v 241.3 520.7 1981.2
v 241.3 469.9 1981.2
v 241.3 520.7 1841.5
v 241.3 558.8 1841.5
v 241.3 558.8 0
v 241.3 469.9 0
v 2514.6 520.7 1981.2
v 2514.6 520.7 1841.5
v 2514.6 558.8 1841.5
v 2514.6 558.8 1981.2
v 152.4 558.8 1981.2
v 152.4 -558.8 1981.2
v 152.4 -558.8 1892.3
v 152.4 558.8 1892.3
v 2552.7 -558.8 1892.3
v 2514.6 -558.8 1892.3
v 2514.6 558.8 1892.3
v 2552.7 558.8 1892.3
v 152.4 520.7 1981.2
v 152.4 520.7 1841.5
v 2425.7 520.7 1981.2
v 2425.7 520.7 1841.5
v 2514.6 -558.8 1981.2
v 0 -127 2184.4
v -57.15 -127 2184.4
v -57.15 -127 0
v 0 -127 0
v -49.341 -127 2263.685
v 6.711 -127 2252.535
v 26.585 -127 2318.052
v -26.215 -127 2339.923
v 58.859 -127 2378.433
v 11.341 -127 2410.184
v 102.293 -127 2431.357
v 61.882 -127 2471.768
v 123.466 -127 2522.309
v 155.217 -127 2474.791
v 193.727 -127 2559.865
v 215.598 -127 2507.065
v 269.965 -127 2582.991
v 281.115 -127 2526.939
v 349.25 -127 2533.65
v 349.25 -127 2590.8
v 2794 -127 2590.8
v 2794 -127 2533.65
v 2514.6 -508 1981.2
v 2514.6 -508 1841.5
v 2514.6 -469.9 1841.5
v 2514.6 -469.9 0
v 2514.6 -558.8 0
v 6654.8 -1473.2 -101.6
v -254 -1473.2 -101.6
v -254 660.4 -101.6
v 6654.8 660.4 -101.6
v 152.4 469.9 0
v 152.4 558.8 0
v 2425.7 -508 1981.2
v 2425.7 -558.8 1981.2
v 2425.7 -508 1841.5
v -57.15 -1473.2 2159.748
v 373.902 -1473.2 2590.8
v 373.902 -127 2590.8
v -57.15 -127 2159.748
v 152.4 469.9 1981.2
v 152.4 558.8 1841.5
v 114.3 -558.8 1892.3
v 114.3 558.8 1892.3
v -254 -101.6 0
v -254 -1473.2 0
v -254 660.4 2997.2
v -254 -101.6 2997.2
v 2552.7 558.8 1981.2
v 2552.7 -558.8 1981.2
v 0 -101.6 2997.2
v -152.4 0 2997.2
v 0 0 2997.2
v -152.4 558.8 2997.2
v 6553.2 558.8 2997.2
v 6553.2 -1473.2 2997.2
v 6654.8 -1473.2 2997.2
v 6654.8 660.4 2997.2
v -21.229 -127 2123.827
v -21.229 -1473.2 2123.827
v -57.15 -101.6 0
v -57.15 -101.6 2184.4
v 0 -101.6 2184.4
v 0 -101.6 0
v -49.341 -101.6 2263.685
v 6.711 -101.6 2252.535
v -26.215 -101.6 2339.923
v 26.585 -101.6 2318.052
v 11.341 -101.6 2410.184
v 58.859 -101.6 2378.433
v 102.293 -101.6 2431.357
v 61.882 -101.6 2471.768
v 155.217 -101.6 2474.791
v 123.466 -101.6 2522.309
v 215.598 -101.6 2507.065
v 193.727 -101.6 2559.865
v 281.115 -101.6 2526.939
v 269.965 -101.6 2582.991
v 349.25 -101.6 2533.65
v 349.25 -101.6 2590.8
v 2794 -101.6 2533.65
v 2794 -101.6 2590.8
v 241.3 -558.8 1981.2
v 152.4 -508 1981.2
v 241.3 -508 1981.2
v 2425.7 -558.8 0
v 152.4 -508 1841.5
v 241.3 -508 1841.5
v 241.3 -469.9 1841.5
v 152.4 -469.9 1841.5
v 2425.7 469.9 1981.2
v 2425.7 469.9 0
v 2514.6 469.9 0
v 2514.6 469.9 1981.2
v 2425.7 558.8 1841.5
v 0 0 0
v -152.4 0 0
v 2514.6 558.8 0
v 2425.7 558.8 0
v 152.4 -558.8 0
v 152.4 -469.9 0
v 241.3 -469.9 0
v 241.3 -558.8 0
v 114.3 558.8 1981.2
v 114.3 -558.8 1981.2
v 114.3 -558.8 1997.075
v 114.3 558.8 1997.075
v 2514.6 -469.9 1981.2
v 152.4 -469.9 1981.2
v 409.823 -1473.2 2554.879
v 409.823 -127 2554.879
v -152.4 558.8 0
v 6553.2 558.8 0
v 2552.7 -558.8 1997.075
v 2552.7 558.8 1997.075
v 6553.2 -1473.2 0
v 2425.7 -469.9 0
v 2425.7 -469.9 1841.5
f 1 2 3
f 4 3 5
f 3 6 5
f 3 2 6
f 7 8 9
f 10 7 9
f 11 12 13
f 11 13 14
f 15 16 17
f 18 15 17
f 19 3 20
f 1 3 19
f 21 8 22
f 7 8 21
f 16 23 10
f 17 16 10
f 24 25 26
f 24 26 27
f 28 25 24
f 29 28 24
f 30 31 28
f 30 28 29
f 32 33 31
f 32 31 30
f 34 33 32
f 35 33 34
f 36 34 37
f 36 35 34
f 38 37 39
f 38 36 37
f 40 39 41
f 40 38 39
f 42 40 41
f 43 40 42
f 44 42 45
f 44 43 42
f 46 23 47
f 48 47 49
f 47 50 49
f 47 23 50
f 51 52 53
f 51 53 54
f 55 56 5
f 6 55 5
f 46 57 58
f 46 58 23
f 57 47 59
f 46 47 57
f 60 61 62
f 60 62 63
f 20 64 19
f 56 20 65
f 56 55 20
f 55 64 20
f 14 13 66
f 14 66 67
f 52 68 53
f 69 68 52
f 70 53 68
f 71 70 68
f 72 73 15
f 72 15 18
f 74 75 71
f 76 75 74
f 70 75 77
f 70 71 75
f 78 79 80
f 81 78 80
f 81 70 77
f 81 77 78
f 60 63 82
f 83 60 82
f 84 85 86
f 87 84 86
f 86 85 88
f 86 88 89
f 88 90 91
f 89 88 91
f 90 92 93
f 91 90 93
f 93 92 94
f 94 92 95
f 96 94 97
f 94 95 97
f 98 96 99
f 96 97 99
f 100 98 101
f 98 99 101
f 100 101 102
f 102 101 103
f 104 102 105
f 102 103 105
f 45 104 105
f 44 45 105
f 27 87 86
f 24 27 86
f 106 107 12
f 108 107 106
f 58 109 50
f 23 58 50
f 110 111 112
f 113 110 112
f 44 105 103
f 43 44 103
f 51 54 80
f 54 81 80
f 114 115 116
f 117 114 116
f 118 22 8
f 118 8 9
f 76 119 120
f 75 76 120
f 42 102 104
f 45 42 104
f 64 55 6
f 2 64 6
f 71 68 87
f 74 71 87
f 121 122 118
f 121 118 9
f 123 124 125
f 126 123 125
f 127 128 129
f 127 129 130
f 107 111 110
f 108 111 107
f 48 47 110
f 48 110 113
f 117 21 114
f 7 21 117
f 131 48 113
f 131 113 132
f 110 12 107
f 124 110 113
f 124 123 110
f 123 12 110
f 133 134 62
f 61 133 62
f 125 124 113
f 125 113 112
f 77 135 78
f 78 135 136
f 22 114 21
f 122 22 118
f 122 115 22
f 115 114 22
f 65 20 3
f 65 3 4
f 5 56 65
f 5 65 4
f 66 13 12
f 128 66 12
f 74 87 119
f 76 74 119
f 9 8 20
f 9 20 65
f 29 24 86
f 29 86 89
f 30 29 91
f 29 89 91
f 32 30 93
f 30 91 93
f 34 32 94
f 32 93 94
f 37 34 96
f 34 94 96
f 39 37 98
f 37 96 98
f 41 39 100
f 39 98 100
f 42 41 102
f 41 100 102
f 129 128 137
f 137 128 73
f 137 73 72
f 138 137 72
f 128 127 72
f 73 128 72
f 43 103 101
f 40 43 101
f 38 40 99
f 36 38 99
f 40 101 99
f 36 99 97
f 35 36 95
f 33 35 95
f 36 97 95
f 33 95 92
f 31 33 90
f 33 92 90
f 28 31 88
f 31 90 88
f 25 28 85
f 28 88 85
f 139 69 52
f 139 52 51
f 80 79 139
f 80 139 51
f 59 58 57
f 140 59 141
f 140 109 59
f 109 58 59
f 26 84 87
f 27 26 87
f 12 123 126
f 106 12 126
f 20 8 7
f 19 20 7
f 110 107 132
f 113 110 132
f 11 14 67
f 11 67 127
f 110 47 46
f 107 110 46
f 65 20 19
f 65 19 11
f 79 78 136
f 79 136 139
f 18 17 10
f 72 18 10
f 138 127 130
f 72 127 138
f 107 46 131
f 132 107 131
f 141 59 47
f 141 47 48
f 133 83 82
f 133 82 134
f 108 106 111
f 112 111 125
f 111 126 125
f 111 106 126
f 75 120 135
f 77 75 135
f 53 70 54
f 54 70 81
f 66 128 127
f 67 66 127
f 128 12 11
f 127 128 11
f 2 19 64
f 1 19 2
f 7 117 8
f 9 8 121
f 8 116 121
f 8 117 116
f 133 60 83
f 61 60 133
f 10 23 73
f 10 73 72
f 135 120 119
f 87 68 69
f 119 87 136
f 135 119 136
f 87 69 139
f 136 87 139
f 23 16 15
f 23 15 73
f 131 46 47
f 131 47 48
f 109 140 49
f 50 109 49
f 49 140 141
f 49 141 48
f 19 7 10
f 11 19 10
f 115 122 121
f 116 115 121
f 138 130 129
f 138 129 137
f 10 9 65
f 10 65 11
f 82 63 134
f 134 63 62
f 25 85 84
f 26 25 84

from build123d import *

# Parameters (mm, degrees)
F1_DEPTH  = 2997.2
F2_W      = 6908.8
F2_H      = 2133.6
F3_DEPTH  = 101.6
F5_DEPTH  = 25.4
F7_DEPTH  = 1346.2
F8_W      = 88.9
F8_H      = 88.9
F9_DEPTH  = 1981.2
F10_W     = 38.1
F10_H     = 139.7
F11_DEPTH = 2667
F12_DEPTH = 2362.2
F14_W     = 1117.6
F14_H     = 88.9
F15_DEPTH = 38.1
F17_W     = 2438.4
F17_H     = 1117.6
F18_DEPTH = 15.875


with BuildPart() as f1:
    # F0 (on Top) → F1 (new body)
    with BuildSketch(Plane.XY):
        Polygon((0, -101.6), (0, 0), (-152.4, 0), (-152.4, 558.8), (6553.2, 558.8), (6553.2, -1473.2), (6654.8, -1473.2), (6654.8, 660.4), (6553.2, 660.4), (-254, 660.4), (-254, -101.6), align=None)
    extrude(amount=F1_DEPTH)

    # F2 (on face) → F3 (join)
    with BuildSketch(Plane(origin=(0, 0, 0), x_dir=(1, 0, 0), z_dir=(0, 0, -1))):
        with Locations((3200.4, 406.4)):
            Rectangle(F2_W, F2_H)
    extrude(amount=F3_DEPTH)


with BuildPart() as f5:
    # F4 (on face) → F5 (new body)
    with BuildSketch(Plane.XZ.offset(101.6)):
        with BuildLine():
            Line((2794, 2590.8), (349.25, 2590.8))
            ThreePointArc((349.25, 2590.8), (61.881804, 2471.768196), (-57.15, 2184.4))
            Line((-57.15, 2184.4), (-57.15, 0))
            Line((-57.15, 0), (0, 0))
            Line((0, 0), (0, 2184.4))
            ThreePointArc((0, 2184.4), (102.292957, 2431.357043), (349.25, 2533.65))
            Line((349.25, 2533.65), (2794, 2533.65))
            Line((2794, 2533.65), (2794, 2590.8))
        make_face()
    extrude(amount=F5_DEPTH)


with BuildPart() as f7:
    # F6 (on face) → F7 (new body, through all)
    with BuildSketch(Plane.XZ.offset(127)):
        Polygon((373.902294, 2590.8), (-57.15, 2159.747706), (-21.228976, 2123.826682), (409.823318, 2554.878976), align=None)
    extrude(amount=F7_DEPTH)


with BuildPart() as f9:
    # F8 (on face) → F9 (new body)
    with BuildSketch(Plane.XY):
        with Locations((196.85, 514.35)):
            Rectangle(F8_W, F8_H)
        with Locations((2470.15, 514.35)):
            Rectangle(F8_W, F8_H)
        with Locations((196.85, -514.35)):
            Rectangle(F8_W, F8_H)
        with Locations((2470.15, -514.35)):
            Rectangle(F8_W, F8_H)
    extrude(amount=F9_DEPTH)

    # F10 (on face) → F11 (cut, through all)
    with BuildSketch(Plane.YZ.offset(2514.6)):
        with Locations((539.75, 1911.35)):
            Rectangle(F10_W, F10_H)
        with Locations((-488.95, 1911.35)):
            Rectangle(F10_W, F10_H)
    extrude(amount=-F11_DEPTH, mode=Mode.SUBTRACT)


with BuildPart() as f12:
    # F10 (on face) → F12 (new body, through all)
    with BuildSketch(Plane.YZ.offset(2514.6)):
        with Locations((539.75, 1911.35)):
            Rectangle(F10_W, F10_H)
        with Locations((-488.95, 1911.35)):
            Rectangle(F10_W, F10_H)
    extrude(amount=-F12_DEPTH)


with BuildPart() as f15:
    # F14 (on face) → F15 (new body)
    with BuildSketch(Plane.YZ.offset(2514.6)):
        with Locations((0, 1936.75)):
            Rectangle(F14_W, F14_H)
    extrude(amount=F15_DEPTH)


with BuildPart() as f16_1:
    # F16: instance of F15
    add(f15.part.mirror(Plane(origin=(1333.5, -515.141501, 961.908074), x_dir=(0, 1, 0), z_dir=(1, 0, 0))))


with BuildPart() as f18:
    # F17 (on face) → F18 (new body)
    with BuildSketch(Plane.XY.offset(1981.2)):
        with Locations((1333.5, 0)):
            Rectangle(F17_W, F17_H)
    extrude(amount=F18_DEPTH)


solid = Compound([f1.part, f5.part, f7.part, f9.part, f12.part, f15.part, f16_1.part, f18.part])
